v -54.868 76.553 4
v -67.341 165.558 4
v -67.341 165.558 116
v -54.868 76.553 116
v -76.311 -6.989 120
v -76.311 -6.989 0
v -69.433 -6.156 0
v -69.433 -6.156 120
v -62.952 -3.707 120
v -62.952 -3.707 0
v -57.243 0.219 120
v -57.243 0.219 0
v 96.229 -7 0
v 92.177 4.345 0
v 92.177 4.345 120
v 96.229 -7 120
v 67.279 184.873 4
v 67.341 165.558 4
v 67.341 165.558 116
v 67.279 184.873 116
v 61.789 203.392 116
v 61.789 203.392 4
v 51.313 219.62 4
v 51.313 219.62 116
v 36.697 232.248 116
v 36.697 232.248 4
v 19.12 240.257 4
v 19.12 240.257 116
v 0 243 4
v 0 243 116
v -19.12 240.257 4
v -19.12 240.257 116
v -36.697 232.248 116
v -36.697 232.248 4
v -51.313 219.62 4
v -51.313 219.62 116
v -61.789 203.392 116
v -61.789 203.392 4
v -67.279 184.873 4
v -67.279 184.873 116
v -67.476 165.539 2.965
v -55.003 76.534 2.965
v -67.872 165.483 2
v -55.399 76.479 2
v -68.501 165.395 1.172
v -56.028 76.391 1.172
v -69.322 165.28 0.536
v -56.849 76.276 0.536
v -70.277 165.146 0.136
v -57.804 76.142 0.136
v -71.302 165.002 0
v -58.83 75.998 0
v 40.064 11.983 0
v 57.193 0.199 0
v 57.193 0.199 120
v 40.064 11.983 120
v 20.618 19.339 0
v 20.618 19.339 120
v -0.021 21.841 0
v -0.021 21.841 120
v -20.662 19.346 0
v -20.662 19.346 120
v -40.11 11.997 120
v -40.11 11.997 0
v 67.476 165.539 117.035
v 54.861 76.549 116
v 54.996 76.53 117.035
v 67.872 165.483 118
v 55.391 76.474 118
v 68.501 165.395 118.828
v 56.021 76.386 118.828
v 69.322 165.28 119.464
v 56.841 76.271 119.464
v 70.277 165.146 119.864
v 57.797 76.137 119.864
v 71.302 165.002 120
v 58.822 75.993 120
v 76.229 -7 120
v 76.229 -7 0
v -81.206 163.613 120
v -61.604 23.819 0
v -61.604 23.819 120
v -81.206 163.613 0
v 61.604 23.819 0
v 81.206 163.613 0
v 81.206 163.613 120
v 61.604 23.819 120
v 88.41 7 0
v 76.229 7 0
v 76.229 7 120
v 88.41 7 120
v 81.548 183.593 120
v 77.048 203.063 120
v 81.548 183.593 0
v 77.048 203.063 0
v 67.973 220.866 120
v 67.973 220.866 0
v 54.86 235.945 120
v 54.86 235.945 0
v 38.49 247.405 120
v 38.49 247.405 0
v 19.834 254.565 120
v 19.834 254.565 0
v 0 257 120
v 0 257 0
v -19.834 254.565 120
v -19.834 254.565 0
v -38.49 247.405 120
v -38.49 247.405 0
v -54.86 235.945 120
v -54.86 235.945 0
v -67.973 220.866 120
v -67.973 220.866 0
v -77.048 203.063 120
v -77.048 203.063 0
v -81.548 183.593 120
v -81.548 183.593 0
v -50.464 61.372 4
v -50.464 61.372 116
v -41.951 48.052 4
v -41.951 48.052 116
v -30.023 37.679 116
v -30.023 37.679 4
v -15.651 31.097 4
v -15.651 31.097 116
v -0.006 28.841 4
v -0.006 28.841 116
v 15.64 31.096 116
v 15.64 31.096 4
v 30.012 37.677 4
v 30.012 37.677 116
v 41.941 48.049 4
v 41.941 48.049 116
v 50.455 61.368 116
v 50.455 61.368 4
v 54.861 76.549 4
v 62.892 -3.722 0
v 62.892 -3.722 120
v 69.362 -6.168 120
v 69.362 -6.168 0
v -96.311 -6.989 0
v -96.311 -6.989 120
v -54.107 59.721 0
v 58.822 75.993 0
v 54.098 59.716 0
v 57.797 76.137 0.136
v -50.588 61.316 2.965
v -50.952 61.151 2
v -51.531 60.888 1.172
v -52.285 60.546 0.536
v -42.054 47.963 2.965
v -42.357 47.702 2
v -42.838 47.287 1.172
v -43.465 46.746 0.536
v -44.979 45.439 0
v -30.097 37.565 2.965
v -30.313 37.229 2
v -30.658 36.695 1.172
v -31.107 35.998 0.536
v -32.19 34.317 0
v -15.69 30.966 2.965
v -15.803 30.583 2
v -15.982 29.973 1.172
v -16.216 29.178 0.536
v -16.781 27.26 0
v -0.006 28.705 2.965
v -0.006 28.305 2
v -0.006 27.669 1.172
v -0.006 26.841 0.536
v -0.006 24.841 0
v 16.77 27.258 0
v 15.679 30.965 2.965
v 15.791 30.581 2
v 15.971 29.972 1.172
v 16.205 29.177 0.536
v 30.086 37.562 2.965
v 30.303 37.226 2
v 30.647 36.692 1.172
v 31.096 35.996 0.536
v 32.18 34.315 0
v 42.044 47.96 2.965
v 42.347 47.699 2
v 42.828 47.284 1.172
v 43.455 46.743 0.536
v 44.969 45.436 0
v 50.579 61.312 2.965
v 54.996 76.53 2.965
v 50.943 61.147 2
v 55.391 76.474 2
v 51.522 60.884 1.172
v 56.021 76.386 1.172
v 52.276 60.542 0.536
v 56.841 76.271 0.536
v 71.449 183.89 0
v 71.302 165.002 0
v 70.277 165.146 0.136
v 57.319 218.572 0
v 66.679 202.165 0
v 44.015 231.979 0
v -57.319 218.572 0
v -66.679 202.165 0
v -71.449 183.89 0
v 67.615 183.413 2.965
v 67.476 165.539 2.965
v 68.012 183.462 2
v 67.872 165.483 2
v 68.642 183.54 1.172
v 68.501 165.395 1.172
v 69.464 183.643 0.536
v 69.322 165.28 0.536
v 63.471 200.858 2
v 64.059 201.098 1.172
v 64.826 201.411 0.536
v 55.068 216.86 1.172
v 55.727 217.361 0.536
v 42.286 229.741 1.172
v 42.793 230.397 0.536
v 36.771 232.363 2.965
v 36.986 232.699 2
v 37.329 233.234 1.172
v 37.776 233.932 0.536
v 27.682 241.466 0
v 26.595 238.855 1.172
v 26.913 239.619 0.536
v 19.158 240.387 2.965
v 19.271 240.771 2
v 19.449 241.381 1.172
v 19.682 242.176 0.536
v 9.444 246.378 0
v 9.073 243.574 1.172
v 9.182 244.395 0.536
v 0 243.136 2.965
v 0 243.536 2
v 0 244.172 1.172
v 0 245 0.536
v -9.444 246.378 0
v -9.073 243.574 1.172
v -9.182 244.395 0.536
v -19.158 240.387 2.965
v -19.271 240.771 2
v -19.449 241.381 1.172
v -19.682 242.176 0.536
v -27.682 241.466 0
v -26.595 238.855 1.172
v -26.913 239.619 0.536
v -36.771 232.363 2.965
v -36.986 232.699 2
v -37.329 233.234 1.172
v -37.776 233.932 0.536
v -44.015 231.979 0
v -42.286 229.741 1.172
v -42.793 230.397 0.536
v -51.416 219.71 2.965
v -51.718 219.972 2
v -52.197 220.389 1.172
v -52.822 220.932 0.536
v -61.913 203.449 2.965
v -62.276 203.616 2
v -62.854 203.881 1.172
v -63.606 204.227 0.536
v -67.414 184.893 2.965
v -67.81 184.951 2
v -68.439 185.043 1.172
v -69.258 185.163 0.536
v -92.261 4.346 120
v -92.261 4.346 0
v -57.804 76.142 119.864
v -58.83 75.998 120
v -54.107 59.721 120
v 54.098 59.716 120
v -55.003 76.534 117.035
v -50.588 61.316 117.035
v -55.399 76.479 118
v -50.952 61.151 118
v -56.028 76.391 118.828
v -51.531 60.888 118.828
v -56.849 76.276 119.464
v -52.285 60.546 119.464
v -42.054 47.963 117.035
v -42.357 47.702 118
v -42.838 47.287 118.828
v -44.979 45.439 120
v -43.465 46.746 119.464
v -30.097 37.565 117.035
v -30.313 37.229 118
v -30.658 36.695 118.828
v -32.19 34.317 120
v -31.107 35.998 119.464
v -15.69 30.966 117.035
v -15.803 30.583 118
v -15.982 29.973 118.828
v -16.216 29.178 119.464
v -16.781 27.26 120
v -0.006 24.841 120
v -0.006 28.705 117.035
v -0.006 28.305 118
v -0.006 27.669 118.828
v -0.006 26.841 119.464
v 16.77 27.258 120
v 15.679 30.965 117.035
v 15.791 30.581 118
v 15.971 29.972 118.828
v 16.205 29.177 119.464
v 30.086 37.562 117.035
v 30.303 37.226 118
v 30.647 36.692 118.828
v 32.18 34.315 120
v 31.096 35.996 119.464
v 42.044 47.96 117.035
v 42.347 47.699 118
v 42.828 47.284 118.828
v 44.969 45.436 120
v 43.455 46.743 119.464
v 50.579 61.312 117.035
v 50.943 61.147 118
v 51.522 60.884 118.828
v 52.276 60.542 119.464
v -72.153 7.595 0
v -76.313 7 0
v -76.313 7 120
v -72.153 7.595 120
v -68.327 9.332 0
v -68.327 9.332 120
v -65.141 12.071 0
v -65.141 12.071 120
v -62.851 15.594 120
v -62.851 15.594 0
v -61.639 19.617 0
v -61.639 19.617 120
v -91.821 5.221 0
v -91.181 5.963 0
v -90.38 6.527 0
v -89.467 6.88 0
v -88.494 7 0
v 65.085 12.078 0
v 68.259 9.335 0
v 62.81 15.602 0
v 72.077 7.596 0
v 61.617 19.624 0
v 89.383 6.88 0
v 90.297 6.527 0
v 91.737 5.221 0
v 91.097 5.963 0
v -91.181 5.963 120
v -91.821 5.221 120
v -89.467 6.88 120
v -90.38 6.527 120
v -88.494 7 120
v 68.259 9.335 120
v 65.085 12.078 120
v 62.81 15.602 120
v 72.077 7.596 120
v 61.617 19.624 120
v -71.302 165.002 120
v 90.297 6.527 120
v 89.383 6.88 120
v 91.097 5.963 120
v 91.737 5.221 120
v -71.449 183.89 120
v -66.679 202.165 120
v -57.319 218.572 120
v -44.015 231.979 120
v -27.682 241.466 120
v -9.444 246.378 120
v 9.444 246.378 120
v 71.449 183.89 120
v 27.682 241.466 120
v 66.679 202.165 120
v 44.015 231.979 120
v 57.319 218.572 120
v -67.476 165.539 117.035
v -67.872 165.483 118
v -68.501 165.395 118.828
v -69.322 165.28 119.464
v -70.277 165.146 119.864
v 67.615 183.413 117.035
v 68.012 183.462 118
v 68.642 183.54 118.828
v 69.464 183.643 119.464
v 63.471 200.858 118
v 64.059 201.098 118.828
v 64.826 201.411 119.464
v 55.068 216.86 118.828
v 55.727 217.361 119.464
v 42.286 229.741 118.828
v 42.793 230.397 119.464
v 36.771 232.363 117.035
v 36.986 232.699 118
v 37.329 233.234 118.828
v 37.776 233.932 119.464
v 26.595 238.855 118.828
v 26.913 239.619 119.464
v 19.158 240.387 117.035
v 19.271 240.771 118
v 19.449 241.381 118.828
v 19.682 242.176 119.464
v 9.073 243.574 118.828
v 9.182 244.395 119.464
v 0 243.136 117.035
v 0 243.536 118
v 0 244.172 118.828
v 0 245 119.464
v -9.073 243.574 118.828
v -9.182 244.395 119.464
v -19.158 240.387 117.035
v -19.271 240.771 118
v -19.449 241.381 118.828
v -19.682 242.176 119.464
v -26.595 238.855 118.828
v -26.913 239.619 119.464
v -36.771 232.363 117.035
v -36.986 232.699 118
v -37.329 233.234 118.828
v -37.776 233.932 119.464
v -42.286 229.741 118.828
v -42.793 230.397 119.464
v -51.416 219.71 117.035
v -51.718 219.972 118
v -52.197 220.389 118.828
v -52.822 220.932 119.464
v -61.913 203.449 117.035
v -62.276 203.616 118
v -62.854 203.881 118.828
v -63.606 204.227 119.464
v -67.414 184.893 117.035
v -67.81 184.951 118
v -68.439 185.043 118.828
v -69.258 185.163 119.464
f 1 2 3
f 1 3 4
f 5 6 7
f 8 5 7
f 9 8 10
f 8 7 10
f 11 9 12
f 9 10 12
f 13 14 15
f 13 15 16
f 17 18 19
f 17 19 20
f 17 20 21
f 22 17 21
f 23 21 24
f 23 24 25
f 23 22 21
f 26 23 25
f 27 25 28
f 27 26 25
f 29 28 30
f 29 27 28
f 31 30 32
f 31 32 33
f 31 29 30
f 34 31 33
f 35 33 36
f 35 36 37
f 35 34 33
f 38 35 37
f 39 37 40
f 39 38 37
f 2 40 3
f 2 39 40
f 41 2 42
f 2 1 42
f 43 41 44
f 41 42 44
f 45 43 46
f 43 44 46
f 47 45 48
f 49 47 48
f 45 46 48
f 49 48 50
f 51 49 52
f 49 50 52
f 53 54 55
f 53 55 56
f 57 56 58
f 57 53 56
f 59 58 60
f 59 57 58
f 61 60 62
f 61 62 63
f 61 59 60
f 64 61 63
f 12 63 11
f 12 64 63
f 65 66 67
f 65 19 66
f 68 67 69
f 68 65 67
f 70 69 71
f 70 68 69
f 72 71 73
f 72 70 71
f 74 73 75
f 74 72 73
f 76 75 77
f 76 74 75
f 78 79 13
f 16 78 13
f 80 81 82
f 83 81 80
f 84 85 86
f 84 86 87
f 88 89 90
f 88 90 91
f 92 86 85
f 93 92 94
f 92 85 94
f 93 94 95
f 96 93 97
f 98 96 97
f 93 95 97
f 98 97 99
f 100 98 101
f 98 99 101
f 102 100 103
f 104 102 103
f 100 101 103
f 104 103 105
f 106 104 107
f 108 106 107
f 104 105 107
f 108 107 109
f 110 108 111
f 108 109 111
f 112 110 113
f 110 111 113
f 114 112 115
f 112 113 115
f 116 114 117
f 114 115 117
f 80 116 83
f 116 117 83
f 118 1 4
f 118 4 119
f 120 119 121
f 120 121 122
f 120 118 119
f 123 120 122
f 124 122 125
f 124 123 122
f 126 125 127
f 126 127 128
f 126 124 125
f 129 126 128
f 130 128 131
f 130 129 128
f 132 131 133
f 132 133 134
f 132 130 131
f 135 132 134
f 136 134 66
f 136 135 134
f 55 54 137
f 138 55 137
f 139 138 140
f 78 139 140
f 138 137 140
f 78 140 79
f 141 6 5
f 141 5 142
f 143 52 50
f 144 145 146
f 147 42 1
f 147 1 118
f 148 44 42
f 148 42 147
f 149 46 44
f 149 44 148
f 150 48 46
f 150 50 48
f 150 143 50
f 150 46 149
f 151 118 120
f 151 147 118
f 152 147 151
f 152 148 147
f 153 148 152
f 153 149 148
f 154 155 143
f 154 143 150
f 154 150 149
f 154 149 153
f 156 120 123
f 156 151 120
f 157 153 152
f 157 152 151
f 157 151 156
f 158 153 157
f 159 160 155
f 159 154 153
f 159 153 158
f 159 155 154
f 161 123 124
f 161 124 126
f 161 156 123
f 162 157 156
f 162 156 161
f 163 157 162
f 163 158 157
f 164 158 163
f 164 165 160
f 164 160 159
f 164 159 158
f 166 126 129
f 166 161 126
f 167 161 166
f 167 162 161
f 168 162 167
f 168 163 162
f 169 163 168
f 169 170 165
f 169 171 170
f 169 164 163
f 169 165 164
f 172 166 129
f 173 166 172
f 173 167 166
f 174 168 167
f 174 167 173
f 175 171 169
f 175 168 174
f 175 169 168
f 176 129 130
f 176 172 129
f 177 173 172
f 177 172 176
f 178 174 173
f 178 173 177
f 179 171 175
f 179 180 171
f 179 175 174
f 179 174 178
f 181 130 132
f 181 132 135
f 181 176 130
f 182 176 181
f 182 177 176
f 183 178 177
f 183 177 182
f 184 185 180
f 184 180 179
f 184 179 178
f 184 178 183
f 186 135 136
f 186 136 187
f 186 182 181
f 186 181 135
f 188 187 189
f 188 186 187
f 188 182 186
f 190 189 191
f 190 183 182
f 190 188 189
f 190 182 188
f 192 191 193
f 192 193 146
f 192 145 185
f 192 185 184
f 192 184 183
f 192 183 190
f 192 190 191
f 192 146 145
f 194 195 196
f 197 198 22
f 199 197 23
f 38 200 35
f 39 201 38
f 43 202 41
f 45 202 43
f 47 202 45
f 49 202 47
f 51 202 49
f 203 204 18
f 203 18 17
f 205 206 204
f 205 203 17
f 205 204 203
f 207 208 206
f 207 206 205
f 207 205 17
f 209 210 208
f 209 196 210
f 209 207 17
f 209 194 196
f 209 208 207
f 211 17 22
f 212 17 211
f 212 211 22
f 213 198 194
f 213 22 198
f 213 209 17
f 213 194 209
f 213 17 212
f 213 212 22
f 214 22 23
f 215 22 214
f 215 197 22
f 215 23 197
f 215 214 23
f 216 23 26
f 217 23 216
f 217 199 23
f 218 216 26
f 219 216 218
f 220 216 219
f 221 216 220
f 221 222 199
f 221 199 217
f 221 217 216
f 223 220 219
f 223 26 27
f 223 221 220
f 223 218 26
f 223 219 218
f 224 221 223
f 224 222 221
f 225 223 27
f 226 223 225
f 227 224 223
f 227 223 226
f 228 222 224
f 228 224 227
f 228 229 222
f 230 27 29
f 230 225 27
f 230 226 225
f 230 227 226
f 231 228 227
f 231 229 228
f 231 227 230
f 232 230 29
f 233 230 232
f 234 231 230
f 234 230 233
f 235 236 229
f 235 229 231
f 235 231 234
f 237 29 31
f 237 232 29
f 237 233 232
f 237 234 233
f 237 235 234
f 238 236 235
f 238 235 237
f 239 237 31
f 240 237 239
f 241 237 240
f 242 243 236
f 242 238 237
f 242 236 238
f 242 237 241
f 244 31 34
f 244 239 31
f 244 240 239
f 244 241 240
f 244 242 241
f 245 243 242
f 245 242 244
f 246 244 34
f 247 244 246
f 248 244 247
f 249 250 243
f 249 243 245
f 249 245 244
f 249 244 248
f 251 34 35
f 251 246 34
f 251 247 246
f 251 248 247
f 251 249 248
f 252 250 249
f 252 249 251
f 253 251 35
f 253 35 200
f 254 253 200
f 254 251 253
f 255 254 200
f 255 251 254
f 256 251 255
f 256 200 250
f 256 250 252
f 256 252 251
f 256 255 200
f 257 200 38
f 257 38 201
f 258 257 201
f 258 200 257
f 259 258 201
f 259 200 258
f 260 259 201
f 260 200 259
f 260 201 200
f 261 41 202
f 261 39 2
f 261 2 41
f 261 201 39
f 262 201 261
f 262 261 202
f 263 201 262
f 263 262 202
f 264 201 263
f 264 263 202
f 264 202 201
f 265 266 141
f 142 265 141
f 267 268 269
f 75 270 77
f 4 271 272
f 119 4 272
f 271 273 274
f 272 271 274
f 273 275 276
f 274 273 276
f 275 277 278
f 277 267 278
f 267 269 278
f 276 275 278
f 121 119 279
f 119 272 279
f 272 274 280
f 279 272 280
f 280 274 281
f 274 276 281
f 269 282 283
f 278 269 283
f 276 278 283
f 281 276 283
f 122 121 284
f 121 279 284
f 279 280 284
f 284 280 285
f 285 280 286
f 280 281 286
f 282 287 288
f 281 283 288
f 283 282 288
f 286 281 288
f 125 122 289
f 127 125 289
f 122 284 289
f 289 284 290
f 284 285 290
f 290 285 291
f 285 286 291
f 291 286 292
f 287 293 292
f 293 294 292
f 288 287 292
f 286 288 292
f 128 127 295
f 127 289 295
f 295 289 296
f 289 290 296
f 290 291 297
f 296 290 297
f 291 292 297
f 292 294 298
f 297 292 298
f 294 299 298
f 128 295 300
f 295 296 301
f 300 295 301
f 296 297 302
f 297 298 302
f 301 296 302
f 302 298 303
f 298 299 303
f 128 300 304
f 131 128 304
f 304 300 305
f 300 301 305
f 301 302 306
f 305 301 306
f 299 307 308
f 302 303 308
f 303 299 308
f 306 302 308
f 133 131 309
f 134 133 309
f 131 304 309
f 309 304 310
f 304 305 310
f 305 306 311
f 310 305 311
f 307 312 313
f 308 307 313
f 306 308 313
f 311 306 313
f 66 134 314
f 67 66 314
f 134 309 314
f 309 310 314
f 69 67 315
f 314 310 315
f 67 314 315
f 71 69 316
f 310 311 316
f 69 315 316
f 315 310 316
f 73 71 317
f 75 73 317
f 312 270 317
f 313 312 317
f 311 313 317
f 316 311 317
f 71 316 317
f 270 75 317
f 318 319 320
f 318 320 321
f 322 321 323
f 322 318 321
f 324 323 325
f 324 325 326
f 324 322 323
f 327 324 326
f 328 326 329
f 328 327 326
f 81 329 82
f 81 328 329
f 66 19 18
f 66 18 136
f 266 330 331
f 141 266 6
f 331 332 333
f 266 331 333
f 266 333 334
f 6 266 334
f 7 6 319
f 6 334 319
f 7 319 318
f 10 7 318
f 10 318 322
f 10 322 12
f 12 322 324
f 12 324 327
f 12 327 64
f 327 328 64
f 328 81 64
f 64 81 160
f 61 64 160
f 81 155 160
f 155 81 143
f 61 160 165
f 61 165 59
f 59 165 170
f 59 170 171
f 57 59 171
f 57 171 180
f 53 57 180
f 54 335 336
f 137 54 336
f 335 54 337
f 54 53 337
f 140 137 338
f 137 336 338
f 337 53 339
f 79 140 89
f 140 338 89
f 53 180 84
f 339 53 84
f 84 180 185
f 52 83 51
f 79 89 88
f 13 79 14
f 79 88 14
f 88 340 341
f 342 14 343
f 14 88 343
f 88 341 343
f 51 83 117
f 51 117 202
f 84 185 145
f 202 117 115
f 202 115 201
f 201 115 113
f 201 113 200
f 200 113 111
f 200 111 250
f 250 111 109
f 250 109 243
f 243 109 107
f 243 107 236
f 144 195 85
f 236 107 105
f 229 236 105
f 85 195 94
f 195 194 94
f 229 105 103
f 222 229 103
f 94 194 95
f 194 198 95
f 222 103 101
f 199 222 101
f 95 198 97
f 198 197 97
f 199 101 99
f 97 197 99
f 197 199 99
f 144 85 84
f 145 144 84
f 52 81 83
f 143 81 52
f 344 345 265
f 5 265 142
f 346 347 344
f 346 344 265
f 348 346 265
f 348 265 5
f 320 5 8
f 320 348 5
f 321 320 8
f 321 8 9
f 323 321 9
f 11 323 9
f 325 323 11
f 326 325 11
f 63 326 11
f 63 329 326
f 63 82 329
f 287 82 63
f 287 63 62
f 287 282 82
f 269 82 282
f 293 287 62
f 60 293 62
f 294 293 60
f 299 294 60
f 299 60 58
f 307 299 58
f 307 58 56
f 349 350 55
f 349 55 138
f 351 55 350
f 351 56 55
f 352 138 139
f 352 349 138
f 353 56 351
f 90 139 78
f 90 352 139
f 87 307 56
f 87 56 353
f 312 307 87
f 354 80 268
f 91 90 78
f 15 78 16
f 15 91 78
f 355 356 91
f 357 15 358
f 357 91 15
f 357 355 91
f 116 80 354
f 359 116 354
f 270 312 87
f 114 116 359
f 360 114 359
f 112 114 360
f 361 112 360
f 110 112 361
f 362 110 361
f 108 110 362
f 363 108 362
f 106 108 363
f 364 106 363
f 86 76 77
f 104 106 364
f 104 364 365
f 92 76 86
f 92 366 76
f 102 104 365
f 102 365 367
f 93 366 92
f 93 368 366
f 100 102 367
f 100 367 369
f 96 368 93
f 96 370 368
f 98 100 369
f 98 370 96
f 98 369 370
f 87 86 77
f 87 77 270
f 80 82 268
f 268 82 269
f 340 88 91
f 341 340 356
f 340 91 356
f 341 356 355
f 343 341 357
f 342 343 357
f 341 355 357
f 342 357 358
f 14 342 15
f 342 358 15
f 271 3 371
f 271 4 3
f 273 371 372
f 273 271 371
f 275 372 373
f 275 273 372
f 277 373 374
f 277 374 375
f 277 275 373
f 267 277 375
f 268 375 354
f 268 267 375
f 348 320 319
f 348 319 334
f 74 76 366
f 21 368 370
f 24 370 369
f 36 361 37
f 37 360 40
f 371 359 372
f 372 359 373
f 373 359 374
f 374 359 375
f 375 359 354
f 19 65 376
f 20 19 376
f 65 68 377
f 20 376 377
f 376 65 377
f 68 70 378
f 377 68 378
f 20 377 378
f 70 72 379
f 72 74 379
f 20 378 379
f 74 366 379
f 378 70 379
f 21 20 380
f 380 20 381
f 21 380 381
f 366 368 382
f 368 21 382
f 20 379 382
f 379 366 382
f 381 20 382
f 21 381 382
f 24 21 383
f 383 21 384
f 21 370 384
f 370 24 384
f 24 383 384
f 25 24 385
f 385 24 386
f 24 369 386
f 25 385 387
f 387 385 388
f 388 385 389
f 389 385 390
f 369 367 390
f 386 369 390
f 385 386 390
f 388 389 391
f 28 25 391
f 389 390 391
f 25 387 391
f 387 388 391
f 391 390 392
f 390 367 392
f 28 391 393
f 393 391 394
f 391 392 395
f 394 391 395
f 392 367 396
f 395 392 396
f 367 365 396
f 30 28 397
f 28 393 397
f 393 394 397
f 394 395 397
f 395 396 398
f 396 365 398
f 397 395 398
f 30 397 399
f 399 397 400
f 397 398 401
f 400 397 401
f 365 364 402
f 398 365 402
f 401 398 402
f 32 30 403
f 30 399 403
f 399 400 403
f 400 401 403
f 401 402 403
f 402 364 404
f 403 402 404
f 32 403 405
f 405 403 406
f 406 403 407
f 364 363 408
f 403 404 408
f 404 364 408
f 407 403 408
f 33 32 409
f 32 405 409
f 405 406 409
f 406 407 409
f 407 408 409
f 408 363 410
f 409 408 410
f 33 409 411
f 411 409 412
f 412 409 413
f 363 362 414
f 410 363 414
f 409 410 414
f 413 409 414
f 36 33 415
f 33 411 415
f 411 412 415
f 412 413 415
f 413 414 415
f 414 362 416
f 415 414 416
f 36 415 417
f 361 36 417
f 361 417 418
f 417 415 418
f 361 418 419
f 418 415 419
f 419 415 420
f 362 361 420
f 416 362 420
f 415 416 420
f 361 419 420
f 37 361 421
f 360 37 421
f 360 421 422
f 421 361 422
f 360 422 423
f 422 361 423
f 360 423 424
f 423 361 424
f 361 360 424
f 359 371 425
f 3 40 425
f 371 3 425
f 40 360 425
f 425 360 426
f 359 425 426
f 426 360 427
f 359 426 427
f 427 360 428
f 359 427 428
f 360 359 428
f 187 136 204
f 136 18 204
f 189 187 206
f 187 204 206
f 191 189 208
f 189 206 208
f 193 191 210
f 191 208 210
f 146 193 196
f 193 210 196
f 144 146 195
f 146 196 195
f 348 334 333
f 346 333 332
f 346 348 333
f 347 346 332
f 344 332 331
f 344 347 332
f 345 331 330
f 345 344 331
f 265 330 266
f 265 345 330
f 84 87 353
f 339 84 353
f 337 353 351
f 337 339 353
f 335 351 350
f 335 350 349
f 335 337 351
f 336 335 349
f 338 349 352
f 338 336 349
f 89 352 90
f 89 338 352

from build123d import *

# Parameters (mm, degrees)
PAD_DEPTH = 120
FILLET_R  = 4


with BuildPart() as part:
    # Sketch → Pad (new body)
    with BuildSketch(Plane.XY):
        with BuildLine():
            ThreePointArc((81.205589, 163.61348), (0, 257.000003), (-81.205589, 163.61348))
            Line((-61.604046, 23.818887), (-81.205589, 163.61348))
            ThreePointArc((-76.312668, 7.000001), (-65.141069, 12.071111), (-61.604046, 23.818887))
            Line((-76.312668, 7.000001), (-91.312668, 7.000001))
            Line((-91.312668, 7.000001), (-96.311409, -6.989133))
            Line((-76.311409, -6.989133), (-96.311409, -6.989133))
            ThreePointArc((-76.311409, -6.989133), (-66.118961, -5.12685), (-57.243123, 0.218577))
            ThreePointArc((57.192961, 0.198819), (-0.021346, 21.841028), (-57.243123, 0.218577))
            ThreePointArc((57.192961, 0.198819), (66.053148, -5.140178), (76.229044, -6.999999))
            Line((76.229044, -6.999999), (96.229044, -6.999999))
            Line((91.229042, 7.000001), (96.229044, -6.999999))
            Line((76.229042, 7.000001), (91.229042, 7.000001))
            ThreePointArc((61.603815, 23.818922), (65.084835, 12.077624), (76.229042, 7.000001))
            Line((81.205589, 163.61348), (61.603815, 23.818922))
        make_face()
        with BuildLine():
            ThreePointArc((67.341217, 165.557526), (0, 243.000004), (-67.341217, 165.557526))
            Line((-67.341217, 165.557526), (-54.868226, 76.553143))
            ThreePointArc((-54.868226, 76.553143), (-0.005687, 28.841012), (54.860565, 76.548873))
            Line((67.341217, 165.557526), (54.860565, 76.548873))
        make_face(mode=Mode.SUBTRACT)
    extrude(amount=PAD_DEPTH)

    # Fillet
    fillet_edges = [part.edges().sort_by_distance(p)[0] for p in [
        (-54.868226, 76.553143, 60),
        (54.860565, 76.548873, 60),
        (-0.005687, 28.841012, 0),
        (-0.005687, 28.841012, 120),
        (-67.341217, 165.557526, 60),
        (-61.104722, 121.055334, 0),
        (-61.104722, 121.055334, 120),
        (67.341217, 165.557526, 60),
        (0, 243.000004, 0),
        (0, 243.000004, 120),
        (61.100891, 121.0532, 0),
        (61.100891, 121.0532, 120),
        (-91.312668, 7.000001, 60),
        (91.229042, 7.000001, 60),
    ]]
    fillet(fillet_edges, radius=FILLET_R)


solid = part.part
